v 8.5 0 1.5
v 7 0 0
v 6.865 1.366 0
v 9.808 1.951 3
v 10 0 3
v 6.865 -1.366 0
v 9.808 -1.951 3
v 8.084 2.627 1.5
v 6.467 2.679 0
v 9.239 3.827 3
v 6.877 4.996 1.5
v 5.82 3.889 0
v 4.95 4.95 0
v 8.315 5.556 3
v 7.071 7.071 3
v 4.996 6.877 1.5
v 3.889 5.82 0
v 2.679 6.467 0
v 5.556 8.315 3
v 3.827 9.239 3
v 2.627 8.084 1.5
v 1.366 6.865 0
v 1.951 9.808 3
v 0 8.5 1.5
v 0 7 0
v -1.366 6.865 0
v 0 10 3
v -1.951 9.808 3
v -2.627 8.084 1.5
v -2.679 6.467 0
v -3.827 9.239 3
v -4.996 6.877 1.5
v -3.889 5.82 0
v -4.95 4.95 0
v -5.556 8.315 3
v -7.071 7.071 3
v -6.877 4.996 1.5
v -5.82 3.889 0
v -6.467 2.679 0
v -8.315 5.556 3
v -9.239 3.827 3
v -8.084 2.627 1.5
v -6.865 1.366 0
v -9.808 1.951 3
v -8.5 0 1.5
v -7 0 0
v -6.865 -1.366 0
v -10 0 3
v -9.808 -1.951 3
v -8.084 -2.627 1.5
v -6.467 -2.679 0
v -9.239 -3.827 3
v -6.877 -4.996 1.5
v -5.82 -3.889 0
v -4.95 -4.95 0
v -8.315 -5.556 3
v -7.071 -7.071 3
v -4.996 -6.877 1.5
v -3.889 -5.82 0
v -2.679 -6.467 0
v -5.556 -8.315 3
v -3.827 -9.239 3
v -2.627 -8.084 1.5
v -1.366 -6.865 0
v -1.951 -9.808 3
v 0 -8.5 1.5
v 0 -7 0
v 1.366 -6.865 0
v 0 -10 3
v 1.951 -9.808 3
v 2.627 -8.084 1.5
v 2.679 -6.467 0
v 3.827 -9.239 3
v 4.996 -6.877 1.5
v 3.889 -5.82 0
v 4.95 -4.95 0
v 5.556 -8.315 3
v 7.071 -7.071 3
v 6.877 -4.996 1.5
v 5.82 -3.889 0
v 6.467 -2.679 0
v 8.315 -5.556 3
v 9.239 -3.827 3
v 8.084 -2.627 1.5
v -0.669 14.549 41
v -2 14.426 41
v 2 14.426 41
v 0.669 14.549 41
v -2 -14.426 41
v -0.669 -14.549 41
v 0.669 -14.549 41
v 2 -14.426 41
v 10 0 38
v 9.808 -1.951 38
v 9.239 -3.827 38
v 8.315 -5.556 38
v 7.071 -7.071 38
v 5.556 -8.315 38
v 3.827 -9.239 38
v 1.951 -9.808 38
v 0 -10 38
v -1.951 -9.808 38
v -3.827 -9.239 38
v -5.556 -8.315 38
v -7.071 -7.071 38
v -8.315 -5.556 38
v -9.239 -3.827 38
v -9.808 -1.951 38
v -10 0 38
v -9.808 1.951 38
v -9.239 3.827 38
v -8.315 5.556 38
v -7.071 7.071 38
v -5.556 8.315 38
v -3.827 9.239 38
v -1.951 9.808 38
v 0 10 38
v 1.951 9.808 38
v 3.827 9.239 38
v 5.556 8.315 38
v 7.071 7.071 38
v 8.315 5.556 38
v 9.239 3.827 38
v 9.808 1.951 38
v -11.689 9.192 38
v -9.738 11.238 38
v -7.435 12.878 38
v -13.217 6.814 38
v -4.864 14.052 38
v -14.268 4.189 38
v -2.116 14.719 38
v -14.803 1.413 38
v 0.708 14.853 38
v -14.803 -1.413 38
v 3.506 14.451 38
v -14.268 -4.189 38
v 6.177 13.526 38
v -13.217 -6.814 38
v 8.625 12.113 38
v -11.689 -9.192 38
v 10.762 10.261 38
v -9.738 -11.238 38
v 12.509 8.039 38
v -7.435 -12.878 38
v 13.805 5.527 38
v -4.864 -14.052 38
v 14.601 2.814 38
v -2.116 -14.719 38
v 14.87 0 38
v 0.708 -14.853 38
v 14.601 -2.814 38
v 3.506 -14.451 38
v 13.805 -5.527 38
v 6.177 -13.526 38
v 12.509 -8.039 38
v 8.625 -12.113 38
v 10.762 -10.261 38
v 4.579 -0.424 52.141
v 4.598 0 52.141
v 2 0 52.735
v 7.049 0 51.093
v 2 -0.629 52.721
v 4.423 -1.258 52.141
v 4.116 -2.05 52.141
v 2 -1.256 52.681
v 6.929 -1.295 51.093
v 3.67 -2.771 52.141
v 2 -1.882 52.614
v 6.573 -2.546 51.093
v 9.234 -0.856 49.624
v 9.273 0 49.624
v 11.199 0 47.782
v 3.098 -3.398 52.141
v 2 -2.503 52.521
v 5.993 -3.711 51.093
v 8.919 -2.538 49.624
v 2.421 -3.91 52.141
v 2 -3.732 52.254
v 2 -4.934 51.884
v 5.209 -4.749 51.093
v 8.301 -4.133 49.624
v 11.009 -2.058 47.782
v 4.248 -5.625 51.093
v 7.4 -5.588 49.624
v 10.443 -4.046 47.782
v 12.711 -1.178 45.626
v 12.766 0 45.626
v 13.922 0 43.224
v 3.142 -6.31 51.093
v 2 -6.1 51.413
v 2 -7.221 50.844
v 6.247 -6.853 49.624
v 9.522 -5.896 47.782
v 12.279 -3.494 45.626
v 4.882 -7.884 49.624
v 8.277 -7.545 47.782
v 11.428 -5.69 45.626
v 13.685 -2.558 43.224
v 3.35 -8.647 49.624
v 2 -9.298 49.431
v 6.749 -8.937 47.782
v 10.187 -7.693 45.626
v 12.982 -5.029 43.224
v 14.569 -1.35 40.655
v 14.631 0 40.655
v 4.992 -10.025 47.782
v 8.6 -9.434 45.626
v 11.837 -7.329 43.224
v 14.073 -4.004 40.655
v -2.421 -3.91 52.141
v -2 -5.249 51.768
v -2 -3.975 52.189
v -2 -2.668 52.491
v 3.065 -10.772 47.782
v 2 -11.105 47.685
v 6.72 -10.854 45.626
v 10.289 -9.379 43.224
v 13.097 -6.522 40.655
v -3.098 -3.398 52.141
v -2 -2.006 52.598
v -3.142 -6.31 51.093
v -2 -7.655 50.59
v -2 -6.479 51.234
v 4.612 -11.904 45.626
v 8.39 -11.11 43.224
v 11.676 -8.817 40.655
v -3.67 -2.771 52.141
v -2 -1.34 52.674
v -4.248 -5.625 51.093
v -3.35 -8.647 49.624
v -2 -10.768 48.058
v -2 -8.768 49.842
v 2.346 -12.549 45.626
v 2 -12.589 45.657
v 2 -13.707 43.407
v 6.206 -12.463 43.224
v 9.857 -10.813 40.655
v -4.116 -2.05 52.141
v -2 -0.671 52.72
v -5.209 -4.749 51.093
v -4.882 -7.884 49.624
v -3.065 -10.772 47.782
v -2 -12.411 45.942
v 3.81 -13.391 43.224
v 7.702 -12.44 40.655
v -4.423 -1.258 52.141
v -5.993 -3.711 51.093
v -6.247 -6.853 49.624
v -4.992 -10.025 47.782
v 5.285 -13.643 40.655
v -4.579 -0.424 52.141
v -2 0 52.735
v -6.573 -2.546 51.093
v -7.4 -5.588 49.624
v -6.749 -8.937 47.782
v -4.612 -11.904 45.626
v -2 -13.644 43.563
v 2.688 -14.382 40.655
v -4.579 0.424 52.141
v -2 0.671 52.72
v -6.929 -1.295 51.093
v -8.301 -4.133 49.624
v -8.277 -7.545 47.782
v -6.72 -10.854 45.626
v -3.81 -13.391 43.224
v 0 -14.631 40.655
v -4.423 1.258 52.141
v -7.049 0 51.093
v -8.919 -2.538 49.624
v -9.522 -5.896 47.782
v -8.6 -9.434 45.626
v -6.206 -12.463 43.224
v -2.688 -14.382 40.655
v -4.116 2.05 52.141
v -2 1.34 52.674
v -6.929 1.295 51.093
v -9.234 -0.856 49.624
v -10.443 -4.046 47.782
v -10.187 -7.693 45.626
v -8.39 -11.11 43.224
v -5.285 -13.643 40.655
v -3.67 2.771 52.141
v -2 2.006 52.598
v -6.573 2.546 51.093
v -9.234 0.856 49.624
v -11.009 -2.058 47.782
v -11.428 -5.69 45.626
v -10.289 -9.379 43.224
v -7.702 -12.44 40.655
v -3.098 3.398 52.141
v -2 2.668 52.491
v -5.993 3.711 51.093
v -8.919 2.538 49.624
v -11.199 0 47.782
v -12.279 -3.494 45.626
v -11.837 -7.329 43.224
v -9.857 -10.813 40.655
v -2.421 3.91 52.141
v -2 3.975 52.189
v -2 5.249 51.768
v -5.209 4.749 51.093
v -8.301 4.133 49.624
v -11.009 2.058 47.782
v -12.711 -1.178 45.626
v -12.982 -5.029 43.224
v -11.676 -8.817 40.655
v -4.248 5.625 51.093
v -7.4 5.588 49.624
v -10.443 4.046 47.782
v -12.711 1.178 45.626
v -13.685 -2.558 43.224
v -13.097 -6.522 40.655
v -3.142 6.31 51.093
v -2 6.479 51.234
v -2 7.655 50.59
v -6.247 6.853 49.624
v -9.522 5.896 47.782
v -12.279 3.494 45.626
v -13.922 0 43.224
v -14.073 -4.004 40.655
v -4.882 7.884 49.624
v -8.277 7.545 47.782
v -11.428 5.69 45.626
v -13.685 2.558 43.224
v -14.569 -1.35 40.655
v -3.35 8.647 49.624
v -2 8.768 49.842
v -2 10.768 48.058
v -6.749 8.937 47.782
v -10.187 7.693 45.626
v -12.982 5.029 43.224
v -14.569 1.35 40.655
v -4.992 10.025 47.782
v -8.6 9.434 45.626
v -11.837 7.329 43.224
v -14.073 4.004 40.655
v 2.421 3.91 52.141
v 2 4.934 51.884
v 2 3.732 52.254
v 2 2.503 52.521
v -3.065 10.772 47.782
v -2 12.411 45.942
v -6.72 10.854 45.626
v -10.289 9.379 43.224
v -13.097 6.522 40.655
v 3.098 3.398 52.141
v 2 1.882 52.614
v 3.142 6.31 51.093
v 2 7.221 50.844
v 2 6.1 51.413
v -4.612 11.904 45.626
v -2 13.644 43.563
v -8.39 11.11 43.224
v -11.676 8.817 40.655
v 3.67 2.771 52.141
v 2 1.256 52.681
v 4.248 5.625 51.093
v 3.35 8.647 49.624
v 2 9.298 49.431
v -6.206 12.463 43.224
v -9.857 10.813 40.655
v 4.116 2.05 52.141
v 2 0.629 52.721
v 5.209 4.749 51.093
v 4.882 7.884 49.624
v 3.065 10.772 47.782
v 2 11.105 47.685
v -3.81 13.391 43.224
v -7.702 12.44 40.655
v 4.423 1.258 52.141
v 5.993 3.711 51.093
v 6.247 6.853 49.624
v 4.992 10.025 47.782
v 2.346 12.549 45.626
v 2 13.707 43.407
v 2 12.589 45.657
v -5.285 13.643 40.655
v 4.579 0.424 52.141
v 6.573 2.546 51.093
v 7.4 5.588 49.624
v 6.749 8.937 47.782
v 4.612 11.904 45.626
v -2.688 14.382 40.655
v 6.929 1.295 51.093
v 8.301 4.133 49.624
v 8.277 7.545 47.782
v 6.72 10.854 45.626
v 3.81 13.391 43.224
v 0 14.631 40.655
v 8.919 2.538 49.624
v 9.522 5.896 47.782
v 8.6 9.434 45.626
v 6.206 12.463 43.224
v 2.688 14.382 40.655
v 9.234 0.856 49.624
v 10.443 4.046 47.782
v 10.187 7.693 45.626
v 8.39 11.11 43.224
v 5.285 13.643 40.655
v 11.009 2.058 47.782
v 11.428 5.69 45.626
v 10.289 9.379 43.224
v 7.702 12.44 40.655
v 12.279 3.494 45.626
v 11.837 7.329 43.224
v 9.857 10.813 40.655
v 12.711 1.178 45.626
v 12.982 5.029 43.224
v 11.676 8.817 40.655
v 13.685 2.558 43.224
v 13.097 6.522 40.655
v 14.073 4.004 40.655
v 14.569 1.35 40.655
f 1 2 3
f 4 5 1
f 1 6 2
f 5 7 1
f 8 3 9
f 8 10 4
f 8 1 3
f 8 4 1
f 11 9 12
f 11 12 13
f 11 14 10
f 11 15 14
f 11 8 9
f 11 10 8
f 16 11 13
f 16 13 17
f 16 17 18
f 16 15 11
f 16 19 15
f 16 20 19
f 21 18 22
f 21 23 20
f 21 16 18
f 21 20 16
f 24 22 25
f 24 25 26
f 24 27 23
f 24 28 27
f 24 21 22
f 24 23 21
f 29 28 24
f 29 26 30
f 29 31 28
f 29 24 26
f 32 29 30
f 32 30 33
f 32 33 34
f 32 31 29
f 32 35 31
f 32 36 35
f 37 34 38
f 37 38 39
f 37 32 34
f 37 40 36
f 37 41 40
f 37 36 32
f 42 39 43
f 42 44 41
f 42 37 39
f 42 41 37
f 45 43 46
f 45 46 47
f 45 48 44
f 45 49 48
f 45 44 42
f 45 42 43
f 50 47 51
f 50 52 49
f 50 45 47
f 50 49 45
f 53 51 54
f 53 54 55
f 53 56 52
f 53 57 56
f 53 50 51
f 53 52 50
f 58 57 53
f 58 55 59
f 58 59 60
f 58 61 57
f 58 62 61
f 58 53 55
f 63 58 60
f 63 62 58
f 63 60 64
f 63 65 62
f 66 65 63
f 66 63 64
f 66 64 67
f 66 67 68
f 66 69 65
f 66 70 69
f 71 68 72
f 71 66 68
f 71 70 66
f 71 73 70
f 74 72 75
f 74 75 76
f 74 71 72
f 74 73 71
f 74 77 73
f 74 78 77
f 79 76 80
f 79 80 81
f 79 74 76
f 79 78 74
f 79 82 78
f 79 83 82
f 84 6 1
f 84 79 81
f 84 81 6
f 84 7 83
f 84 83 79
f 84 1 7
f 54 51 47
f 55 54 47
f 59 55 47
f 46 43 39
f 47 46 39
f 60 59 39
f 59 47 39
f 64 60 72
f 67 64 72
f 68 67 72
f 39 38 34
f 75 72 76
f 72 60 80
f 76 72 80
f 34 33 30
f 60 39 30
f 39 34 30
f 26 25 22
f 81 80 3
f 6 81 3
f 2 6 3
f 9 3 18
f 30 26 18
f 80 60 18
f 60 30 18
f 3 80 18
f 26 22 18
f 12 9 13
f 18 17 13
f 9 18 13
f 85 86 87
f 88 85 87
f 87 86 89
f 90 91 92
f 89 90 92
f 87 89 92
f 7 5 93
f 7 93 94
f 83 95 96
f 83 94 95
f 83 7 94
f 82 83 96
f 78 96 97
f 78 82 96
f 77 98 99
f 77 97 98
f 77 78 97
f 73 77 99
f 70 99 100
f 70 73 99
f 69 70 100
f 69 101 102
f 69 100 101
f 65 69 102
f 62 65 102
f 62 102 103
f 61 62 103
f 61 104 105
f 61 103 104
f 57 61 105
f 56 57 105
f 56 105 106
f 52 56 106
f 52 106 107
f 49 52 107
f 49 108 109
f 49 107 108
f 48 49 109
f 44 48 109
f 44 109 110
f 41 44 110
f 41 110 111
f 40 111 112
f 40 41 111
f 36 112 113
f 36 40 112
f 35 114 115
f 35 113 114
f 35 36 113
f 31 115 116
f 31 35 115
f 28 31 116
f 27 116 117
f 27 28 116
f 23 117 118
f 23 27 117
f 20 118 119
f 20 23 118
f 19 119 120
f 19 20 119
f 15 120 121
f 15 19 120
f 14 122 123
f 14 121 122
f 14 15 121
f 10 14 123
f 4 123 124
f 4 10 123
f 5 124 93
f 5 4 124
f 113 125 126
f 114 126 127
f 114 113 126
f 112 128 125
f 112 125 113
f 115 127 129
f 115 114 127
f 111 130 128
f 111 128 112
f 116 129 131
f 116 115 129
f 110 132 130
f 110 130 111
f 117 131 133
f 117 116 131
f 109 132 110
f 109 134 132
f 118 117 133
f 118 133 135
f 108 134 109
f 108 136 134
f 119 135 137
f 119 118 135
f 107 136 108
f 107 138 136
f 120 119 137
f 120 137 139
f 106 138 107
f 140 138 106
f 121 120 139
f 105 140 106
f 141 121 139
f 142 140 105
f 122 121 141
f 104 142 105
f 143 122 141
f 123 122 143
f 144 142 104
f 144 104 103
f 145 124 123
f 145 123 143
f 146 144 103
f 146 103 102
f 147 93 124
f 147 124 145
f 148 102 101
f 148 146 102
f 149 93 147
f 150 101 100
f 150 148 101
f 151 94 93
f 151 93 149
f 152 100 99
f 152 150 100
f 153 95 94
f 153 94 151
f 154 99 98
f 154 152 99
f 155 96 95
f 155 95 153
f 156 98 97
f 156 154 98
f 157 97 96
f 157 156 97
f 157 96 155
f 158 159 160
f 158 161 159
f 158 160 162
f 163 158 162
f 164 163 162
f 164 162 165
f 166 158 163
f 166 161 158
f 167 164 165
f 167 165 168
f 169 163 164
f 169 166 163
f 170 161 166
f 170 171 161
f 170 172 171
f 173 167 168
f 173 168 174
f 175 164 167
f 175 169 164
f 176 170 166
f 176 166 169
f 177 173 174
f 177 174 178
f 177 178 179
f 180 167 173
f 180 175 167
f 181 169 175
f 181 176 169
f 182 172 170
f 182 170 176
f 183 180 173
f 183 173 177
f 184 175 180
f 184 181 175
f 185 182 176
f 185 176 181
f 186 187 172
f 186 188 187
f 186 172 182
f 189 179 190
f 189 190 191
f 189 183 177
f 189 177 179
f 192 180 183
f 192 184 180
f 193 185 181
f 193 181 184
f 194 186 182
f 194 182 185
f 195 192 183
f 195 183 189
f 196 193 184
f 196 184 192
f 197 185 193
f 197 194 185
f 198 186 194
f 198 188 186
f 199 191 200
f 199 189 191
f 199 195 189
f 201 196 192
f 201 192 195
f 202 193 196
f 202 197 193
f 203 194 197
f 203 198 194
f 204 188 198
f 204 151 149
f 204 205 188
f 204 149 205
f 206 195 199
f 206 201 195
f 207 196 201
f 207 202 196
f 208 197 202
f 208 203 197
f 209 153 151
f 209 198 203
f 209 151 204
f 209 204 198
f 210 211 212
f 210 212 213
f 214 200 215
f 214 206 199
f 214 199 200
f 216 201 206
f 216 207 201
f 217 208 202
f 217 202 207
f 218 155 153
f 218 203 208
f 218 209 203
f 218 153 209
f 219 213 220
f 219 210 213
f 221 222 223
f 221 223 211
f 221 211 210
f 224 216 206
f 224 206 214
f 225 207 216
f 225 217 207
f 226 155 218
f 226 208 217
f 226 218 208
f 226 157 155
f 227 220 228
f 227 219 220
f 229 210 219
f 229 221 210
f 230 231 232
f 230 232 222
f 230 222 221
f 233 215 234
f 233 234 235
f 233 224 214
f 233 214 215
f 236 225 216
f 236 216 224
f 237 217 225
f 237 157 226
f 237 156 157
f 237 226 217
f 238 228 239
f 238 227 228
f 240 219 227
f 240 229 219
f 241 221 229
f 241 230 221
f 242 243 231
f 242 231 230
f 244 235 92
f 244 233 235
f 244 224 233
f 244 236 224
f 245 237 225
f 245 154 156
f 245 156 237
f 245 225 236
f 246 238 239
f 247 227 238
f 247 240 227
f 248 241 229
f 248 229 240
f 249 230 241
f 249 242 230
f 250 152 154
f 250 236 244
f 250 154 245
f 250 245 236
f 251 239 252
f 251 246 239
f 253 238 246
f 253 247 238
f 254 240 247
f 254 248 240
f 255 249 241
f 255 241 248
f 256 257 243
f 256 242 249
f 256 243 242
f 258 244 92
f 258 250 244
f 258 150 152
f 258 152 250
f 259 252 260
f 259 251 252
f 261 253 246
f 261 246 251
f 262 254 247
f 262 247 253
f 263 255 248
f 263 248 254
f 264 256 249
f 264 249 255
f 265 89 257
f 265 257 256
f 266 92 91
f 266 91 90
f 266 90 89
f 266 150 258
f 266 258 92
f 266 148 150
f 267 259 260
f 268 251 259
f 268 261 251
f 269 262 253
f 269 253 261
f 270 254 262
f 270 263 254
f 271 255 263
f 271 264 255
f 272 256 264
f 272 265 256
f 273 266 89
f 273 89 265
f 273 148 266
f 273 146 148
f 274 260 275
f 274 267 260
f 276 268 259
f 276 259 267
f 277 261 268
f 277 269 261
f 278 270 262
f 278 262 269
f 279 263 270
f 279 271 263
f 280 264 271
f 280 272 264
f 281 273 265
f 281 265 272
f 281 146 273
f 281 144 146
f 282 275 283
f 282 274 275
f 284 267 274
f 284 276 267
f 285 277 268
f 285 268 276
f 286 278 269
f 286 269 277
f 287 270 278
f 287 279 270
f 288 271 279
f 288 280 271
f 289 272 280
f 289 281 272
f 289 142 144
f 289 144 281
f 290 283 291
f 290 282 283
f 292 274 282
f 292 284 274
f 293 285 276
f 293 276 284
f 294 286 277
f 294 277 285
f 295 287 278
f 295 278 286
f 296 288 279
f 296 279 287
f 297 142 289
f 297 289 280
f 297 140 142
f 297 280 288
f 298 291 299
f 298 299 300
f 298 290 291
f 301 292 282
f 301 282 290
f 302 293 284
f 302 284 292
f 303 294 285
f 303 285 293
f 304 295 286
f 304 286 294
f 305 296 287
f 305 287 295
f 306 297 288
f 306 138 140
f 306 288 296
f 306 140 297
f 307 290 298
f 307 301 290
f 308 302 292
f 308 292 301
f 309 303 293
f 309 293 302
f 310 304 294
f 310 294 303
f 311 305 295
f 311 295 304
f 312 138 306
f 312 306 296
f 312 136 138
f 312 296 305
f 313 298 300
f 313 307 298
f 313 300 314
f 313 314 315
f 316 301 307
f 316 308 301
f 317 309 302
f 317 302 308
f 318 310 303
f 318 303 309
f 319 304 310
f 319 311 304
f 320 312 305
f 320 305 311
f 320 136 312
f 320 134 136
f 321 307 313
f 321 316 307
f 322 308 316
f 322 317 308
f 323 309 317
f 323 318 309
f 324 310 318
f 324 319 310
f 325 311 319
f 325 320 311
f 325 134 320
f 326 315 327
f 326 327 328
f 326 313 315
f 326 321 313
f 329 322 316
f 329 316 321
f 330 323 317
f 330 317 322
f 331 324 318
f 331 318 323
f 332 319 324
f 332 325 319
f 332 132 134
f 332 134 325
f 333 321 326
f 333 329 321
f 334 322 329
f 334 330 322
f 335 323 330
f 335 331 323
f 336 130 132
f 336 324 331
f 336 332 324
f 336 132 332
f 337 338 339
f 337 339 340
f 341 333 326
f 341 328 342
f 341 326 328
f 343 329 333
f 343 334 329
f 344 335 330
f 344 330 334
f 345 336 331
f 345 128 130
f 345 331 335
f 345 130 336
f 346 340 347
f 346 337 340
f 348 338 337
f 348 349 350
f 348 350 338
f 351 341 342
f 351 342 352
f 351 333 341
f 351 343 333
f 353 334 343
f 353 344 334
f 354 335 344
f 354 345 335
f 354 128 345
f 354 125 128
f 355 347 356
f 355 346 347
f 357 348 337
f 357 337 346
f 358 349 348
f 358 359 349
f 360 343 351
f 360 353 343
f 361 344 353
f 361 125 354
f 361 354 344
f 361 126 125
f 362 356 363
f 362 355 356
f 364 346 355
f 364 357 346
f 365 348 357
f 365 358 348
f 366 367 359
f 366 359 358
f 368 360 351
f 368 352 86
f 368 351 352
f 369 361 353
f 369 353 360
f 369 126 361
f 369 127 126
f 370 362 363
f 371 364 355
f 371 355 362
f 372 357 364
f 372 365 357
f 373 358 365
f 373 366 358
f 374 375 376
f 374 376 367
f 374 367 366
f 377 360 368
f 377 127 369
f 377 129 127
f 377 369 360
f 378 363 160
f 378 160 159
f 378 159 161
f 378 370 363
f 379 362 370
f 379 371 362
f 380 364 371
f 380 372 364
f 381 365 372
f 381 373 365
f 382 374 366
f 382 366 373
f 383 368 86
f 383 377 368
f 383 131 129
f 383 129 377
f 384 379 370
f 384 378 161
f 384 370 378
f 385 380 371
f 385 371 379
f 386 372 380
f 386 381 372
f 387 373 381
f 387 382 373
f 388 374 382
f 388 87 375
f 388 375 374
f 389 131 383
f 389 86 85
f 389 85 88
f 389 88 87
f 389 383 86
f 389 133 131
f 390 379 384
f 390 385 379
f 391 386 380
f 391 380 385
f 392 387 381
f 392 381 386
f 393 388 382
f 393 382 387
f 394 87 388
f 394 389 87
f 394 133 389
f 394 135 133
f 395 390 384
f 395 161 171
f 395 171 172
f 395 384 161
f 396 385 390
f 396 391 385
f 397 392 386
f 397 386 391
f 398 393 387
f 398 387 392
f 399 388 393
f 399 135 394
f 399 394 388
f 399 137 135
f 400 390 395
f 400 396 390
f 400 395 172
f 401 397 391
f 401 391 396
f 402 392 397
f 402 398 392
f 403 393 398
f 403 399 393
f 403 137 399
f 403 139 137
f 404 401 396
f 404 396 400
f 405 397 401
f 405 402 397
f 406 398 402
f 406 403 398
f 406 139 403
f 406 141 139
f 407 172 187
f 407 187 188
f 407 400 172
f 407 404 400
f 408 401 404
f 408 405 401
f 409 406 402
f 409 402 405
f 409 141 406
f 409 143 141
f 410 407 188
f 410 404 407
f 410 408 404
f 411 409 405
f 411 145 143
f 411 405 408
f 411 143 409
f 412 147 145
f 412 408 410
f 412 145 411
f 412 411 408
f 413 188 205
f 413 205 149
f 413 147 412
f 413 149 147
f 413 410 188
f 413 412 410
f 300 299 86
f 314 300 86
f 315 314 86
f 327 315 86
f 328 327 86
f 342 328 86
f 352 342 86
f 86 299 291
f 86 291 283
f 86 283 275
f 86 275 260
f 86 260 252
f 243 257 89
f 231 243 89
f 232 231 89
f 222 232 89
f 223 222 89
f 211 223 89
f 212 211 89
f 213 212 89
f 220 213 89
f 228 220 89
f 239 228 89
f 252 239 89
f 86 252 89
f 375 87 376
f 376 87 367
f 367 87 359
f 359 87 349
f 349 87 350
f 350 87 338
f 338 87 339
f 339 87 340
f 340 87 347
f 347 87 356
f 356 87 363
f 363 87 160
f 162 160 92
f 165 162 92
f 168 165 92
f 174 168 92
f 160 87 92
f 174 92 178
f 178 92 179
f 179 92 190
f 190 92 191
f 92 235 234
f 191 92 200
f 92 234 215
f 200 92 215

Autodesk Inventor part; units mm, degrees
ref_plane "YZ Plane" through (0, 0, 0) normal (1, 0, 0) x (0, 1, 0)
ref_plane "XZ Plane" through (0, 0, 0) normal (0, 1, 0) x (-1, 0, 0)
ref_plane "XY Plane" through (0, 0, 0) normal (0, 0, 1) x (1, 0, 0)
sketch "Esboço1" plane through (0, 0, 0) normal (0, 0, 1) x (1, 0, 0)
  circle A0 centre (0, 0) radius 10
  dimension "d0" = 20
extrude "Extrusão1" add sketch "Esboço1" along normal blind 38
chamfer "Chanfro1" distance 3 angle 45 1 edges at (-10, 0, 0)
sketch "Esboço3" plane through (0, 0, 0) normal (0, 1, 0) x (-1, 0, 0)
  line L0 (10, 38) -> (-10, 38) projected
  arc A0 (14.87, 38) -> (-14.87, 38) centre (0, 38) ccw
  line L1 (0, 52.87) -> (0, 38)
  line L2 (-14.87, 38) -> (14.87, 38)
  point P0 (0, 0)
  dimension "d7" = 29.74
revolve "Revolução1" add sketch "Esboço3" angle 360 about axis through (0, 0, 52.87) along (0, 0, -1) picked at (-6.4238, 41.8753) contours L0 L2 A0 L1
sketch "Esboço4" plane through (0, 0, 0) normal (0, 1, 0) x (-1, 0, 0)
  line L0 (-2, 57) -> (2, 57)
  line L1 (2, 57) -> (2, 41)
  line L2 (2, 41) -> (-2, 41)
  line L3 (-2, 41) -> (-2, 57)
  line L4 (7, 0) -> (-7, 0) projected
  point P0 (0, 0)
  point P1 (0, 0)
  dimension "d9" = 4
  dimension "d10" = 16
  dimension "d11" = 41
  dimension "d13" = 2
extrude "Extrusão2" cut sketch "Esboço4" along normal mid plane 38
properties part number "Parafuso da Valvula"
